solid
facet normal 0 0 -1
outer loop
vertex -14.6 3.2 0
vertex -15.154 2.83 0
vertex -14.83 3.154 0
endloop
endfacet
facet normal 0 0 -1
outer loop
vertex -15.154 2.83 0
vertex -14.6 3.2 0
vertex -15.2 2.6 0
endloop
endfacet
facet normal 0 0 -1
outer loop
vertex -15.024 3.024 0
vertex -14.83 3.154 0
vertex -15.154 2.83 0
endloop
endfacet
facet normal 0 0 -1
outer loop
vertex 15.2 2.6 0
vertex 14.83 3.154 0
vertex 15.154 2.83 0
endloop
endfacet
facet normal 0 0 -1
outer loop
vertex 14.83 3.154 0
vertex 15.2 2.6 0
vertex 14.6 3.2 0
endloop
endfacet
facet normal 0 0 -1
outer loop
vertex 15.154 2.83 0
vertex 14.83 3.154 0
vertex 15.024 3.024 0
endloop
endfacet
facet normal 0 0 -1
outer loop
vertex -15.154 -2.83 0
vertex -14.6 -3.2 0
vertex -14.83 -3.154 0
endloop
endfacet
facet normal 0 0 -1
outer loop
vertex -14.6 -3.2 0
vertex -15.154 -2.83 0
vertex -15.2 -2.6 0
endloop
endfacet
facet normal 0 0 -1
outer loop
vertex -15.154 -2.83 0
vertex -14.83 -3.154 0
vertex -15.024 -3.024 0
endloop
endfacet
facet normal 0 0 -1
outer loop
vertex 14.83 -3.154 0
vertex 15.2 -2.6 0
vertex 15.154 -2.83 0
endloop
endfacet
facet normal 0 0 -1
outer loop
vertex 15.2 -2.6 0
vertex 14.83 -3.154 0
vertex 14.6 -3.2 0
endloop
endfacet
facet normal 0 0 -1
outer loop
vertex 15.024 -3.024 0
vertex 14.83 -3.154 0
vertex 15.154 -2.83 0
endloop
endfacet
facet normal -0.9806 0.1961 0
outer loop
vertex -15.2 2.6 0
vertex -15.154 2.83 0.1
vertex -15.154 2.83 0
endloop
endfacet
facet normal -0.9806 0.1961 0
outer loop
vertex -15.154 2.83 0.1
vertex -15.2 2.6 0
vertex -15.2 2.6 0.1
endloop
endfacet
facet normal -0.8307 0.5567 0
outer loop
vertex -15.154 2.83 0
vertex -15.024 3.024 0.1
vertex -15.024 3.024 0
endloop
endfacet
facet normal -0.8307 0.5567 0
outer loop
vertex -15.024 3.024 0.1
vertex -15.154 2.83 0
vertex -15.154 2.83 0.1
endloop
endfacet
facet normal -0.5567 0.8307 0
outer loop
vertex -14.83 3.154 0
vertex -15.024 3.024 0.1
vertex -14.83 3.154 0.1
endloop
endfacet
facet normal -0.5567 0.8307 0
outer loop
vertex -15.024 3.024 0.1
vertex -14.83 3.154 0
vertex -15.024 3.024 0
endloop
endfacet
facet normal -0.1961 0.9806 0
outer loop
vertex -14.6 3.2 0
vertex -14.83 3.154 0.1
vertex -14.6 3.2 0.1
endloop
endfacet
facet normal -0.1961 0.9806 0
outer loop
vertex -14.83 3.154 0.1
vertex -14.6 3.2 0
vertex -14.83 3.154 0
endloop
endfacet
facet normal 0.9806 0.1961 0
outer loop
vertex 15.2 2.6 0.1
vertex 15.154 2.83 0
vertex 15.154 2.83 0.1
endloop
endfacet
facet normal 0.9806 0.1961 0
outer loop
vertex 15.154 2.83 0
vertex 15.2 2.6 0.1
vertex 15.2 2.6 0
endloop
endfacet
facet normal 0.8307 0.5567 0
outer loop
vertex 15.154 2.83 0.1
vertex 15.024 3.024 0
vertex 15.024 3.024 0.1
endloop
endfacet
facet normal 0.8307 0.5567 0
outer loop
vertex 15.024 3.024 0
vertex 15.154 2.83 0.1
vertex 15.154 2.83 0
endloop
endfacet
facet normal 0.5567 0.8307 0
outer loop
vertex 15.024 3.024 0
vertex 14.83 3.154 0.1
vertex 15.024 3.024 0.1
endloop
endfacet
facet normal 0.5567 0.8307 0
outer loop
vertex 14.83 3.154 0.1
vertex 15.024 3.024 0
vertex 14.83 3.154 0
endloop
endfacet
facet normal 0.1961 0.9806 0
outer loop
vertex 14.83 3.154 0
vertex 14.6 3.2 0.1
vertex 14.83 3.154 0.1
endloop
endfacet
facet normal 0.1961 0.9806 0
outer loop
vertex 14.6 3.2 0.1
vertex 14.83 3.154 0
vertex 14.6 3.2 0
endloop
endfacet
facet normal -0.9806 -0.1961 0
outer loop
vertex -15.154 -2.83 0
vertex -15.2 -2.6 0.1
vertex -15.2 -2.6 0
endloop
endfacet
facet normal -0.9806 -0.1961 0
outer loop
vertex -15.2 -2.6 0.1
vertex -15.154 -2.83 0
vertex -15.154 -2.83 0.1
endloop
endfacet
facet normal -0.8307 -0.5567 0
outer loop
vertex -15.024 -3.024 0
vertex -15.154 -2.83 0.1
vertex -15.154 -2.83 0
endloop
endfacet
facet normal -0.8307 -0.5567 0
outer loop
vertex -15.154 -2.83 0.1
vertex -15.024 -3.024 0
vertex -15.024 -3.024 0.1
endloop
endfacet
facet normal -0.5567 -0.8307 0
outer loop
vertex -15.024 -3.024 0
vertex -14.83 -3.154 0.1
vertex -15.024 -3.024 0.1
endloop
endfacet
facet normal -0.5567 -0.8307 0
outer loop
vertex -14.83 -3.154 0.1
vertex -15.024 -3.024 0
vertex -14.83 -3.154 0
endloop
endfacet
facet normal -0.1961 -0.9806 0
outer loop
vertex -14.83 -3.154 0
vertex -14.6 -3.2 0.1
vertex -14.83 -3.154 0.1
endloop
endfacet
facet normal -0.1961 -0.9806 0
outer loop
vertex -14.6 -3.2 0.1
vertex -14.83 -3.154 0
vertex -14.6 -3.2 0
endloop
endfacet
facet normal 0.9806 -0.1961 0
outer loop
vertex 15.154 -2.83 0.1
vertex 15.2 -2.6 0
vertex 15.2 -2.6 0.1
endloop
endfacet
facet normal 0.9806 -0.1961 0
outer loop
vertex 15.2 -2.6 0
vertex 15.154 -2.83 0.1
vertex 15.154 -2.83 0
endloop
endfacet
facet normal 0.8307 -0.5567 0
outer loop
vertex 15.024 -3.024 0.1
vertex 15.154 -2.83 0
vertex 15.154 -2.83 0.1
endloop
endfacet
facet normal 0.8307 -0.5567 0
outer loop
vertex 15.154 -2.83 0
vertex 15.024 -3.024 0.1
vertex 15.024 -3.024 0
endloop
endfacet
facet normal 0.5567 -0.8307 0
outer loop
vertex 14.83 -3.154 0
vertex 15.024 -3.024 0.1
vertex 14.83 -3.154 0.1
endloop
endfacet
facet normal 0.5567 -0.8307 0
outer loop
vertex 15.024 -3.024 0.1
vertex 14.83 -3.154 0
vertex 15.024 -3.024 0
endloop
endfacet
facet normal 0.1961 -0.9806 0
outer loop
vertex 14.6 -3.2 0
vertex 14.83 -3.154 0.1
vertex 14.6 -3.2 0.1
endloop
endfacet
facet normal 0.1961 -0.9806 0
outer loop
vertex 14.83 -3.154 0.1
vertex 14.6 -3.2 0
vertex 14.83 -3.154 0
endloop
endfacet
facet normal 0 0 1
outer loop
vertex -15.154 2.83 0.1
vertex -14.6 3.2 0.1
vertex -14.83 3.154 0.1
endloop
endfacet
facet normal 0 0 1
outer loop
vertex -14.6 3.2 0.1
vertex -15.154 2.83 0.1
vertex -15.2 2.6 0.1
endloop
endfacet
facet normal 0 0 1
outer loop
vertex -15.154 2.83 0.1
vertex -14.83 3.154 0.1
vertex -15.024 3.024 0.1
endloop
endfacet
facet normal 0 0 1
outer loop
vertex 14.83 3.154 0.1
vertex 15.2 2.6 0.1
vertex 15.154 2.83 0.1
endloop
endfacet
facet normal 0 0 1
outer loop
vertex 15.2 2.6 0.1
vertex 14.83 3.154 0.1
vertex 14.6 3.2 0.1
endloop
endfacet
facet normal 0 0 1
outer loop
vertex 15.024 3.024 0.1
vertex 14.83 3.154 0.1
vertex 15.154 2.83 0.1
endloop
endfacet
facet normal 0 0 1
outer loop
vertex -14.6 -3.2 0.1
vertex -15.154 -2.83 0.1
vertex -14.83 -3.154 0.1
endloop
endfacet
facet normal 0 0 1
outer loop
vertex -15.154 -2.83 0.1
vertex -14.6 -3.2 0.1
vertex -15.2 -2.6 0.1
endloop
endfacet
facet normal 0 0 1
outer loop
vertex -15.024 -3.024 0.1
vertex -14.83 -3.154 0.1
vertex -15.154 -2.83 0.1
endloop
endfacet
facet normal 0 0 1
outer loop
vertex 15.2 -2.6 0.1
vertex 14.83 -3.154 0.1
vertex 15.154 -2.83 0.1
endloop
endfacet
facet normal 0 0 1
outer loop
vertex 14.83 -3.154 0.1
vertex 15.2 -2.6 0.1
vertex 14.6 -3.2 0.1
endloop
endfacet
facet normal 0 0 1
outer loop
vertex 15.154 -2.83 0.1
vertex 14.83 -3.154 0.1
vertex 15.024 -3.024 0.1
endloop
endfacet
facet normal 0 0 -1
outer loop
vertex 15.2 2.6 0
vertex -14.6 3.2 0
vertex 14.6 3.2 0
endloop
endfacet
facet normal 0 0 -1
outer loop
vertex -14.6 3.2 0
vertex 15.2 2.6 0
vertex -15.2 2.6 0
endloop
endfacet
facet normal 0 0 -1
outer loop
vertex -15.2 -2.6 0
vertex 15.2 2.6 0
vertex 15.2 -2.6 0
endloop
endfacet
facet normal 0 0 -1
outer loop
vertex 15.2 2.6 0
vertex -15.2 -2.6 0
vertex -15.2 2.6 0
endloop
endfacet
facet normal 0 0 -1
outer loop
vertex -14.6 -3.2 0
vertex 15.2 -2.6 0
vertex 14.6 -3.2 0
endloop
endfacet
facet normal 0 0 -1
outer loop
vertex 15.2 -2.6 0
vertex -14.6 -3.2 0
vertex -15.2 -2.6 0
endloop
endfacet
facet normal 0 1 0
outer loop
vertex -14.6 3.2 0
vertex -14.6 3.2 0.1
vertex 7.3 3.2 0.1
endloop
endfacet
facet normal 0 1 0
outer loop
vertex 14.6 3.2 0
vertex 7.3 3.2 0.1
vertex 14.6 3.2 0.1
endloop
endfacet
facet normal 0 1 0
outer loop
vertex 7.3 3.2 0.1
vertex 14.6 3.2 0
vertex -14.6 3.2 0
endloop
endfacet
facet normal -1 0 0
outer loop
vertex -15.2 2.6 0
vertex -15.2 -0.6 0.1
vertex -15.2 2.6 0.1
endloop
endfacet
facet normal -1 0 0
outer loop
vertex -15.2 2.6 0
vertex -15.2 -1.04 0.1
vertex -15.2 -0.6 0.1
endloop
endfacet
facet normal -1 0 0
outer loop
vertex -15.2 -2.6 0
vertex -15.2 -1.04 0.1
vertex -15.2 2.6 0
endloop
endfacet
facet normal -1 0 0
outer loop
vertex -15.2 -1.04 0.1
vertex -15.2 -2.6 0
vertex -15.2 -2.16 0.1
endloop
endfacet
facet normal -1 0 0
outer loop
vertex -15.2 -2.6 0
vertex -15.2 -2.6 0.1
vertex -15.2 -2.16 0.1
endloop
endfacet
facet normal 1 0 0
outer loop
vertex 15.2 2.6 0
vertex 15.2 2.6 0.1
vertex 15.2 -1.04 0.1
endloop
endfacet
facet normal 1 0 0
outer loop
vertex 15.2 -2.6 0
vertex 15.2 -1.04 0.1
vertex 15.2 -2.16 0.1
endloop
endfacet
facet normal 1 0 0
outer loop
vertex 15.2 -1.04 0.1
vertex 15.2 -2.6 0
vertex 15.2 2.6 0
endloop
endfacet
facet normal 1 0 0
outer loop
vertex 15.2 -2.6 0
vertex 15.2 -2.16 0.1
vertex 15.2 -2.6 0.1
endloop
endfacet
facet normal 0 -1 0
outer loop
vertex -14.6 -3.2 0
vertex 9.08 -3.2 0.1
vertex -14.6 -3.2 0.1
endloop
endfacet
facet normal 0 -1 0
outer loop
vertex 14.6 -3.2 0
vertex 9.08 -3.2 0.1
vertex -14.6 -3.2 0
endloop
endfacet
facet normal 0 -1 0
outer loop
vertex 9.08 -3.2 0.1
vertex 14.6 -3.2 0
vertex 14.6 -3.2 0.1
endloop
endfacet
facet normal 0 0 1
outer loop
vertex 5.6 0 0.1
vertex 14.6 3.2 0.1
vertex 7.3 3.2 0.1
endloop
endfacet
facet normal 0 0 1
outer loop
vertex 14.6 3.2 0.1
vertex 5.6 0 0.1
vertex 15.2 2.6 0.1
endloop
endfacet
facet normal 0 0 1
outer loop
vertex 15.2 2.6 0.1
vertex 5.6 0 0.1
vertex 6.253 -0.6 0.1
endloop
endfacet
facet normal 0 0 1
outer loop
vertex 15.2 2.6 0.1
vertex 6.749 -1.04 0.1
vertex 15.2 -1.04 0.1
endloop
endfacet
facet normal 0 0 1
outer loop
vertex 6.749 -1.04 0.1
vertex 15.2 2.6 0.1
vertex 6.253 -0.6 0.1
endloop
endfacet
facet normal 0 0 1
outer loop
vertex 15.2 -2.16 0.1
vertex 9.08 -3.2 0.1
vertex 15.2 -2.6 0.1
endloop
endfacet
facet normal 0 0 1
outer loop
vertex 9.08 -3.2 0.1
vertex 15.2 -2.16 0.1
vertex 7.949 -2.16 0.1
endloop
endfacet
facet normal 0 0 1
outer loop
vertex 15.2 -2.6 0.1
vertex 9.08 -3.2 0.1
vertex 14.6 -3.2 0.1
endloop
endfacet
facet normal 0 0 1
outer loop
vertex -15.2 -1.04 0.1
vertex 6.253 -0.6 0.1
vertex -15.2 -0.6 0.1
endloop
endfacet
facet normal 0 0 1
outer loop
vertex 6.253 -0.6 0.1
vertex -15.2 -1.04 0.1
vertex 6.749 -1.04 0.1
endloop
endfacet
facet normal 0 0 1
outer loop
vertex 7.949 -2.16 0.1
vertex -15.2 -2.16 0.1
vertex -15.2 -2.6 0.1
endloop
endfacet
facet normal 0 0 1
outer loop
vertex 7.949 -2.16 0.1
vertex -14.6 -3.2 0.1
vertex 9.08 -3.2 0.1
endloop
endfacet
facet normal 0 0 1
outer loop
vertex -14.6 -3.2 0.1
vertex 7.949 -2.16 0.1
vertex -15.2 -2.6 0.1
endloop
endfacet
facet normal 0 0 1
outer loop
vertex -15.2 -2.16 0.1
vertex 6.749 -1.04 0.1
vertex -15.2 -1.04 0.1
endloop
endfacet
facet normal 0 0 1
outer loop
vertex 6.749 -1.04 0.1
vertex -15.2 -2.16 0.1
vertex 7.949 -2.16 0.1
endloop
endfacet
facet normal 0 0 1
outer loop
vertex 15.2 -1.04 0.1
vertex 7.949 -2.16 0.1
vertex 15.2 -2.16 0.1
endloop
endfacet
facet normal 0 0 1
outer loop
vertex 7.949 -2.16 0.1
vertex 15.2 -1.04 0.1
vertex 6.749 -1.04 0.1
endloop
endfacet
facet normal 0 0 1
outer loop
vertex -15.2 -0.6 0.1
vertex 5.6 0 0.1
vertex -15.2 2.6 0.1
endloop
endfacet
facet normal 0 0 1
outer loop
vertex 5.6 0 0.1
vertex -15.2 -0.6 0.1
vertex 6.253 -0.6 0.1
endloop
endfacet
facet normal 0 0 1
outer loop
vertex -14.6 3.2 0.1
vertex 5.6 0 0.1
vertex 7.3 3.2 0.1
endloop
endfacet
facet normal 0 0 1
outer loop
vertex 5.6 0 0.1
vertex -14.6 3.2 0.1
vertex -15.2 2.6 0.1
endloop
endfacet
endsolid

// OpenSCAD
// file: ../p/1-4cyli.scad
use <../lib.scad>
function ldraw_lib__1_4cyli() = [
// 0 Cylinder 0.25
// 0 Name: 1-4cyli.dat
// 0 Author: James Jessiman
// 0 !LDRAW_ORG Primitive UPDATE 2012-01
// 0 !LICENSE Licensed under CC BY 2.0 and CC BY 4.0 : see CAreadme.txt
// 
// 0 BFC CERTIFY CCW
  [0,"BFC","CERTIFY"],
  [0,"BFC","CCW"],
// 
// 0 !HISTORY 2002-03-23 [sbliss] Added BFC statement.
// 0 !HISTORY 2002-04-25 [PTadmin] Official Update 2002-02
// 0 !HISTORY 2007-06-22 [PTadmin] Header formatted for Contributor Agreement
// 0 !HISTORY 2008-07-01 [PTadmin] Official Update 2008-01
// 0 !HISTORY 2012-02-16 [Philo] Changed to CCW
// 0 !HISTORY 2012-03-30 [PTadmin] Official Update 2012-01
// 
// 
// 4 16 1 1 0 0.9239 1 0.3827 0.9239 0 0.3827 1 0 0
  [4,16,1,1,0,0.9239,1,0.3827,0.9239,0,0.3827,1,0,0],
// 5 24 1 0 0 1 1 0 0.9239 0 0.3827 1 0 -1
  [5,24,1,0,0,1,1,0,0.9239,0,0.3827,1,0,-1],
// 4 16 0.9239 1 0.3827 0.7071 1 0.7071 0.7071 0 0.7071 0.9239 0 0.3827
  [4,16,0.9239,1,0.3827,0.7071,1,0.7071,0.7071,0,0.7071,0.9239,0,0.3827],
// 5 24 0.9239 0 0.3827 0.9239 1 0.3827 0.7071 0 0.7071 1 0 0
  [5,24,0.9239,0,0.3827,0.9239,1,0.3827,0.7071,0,0.7071,1,0,0],
// 4 16 0.7071 1 0.7071 0.3827 1 0.9239 0.3827 0 0.9239 0.7071 0 0.7071
  [4,16,0.7071,1,0.7071,0.3827,1,0.9239,0.3827,0,0.9239,0.7071,0,0.7071],
// 5 24 0.7071 0 0.7071 0.7071 1 0.7071 0.3827 0 0.9239 0.9239 0 0.3827
  [5,24,0.7071,0,0.7071,0.7071,1,0.7071,0.3827,0,0.9239,0.9239,0,0.3827],
// 4 16 0.3827 1 0.9239 0 1 1 0 0 1 0.3827 0 0.9239
  [4,16,0.3827,1,0.9239,0,1,1,0,0,1,0.3827,0,0.9239],
// 5 24 0.3827 0 0.9239 0.3827 1 0.9239 0 0 1 0.7071 0 0.7071
  [5,24,0.3827,0,0.9239,0.3827,1,0.9239,0,0,1,0.7071,0,0.7071],
// 5 24 0 0 1 0 1 1 0.3827 0 0.9239 -1 0 1
  [5,24,0,0,1,0,1,1,0.3827,0,0.9239,-1,0,1],
];
module ldraw_lib__1_4cyli(step=0, col=false, unit=2/5, alt=false, line=0.2, solid=!$preview)
    makepoly(ldraw_lib__1_4cyli(), step=step, col=col, unit=unit, alt=alt, line=line, solid=solid);
ldraw_lib__1_4cyli(line=0.2);
// file: ../p/1-4chrd.scad
use <../lib.scad>
function ldraw_lib__1_4chrd() = [
// 0 Chord 0.25
// 0 Name: 1-4chrd.dat
// 0 Author: Tony Hafner [hafhead]
// 0 !LDRAW_ORG Primitive UPDATE 2012-02
// 0 !LICENSE Licensed under CC BY 2.0 and CC BY 4.0 : see CAreadme.txt
// 
// 0 BFC CERTIFY CCW
  [0,"BFC","CERTIFY"],
  [0,"BFC","CCW"],
// 
// 0 !HISTORY 2004-04-22 [PTadmin] Official Update 2004-02
// 0 !HISTORY 2007-10-09 [PTadmin] Header formatted for Contributor Agreement
// 0 !HISTORY 2008-07-01 [PTadmin] Official Update 2008-01
// 0 !HISTORY 2012-08-02 [MMR1988] Re-creation with PrimGen2 and Rectifier
// 0 !HISTORY 2012-08-09 [PTadmin] Official Update 2012-02
// 
// 
// 4 16 0.9239 0 0.3827 0.3827 0 0.9239 0 0 1 1 0 0
  [4,16,0.9239,0,0.3827,0.3827,0,0.9239,0,0,1,1,0,0],
// 3 16 0.7071 0 0.7071 0.3827 0 0.9239 0.9239 0 0.3827
  [3,16,0.7071,0,0.7071,0.3827,0,0.9239,0.9239,0,0.3827],
];
module ldraw_lib__1_4chrd(step=0, col=false, unit=2/5, alt=false, line=0.2, solid=!$preview)
    makepoly(ldraw_lib__1_4chrd(), step=step, col=col, unit=unit, alt=alt, line=line, solid=solid);
ldraw_lib__1_4chrd(line=0.2);
// main file
use <../lib.scad>
use <../p/1-4chrd.scad>
use <../p/1-4cyli.scad>
function ldraw_lib__6142275f() = [
// 0 Sticker  0.8 x  3.8 with Red Line on Black, Grey and White Background Right
// 0 Name: 6142275f.dat
// 0 Author: Massimo Maso [Sirio]
// 0 !LDRAW_ORG Part UPDATE 2022-06
// 0 !LICENSE Licensed under CC BY 2.0 and CC BY 4.0 : see CAreadme.txt
// 
// 0 BFC CERTIFY CCW
  [0,"BFC","CERTIFY"],
  [0,"BFC","CCW"],
// 
// 0 !KEYWORDS Audi, e-tron, quattro, R18, Set 75872, Speed Champions
// 
// 0 !HISTORY 2022-12-20 [PTadmin] Official Update 2022-06
// 
// 
// 0 // Primitives
// 1 16 -36.5 0 6.5 -1.5 0 0 0 -1 0 0 0 1.5 1-4chrd.dat
  [1,16,-36.5,0,6.5,-1.5,0,0,0,-1,0,0,0,1.5, ldraw_lib__1_4chrd()],
// 1 16 36.5 0 6.5 1.5 0 0 0 -1 0 0 0 1.5 1-4chrd.dat
  [1,16,36.5,0,6.5,1.5,0,0,0,-1,0,0,0,1.5, ldraw_lib__1_4chrd()],
// 1 16 -36.5 0 -6.5 -1.5 0 0 0 -1 0 0 0 -1.5 1-4chrd.dat
  [1,16,-36.5,0,-6.5,-1.5,0,0,0,-1,0,0,0,-1.5, ldraw_lib__1_4chrd()],
// 1 16 36.5 0 -6.5 1.5 0 0 0 -1 0 0 0 -1.5 1-4chrd.dat
  [1,16,36.5,0,-6.5,1.5,0,0,0,-1,0,0,0,-1.5, ldraw_lib__1_4chrd()],
// 1 16 -36.5 0 6.5 -1.5 0 0 0 -.25 0 0 0 1.5 1-4cyli.dat
  [1,16,-36.5,0,6.5,-1.5,0,0,0,-.25,0,0,0,1.5, ldraw_lib__1_4cyli()],
// 1 16 36.5 0 6.5 1.5 0 0 0 -.25 0 0 0 1.5 1-4cyli.dat
  [1,16,36.5,0,6.5,1.5,0,0,0,-.25,0,0,0,1.5, ldraw_lib__1_4cyli()],
// 1 16 -36.5 0 -6.5 -1.5 0 0 0 -.25 0 0 0 -1.5 1-4cyli.dat
  [1,16,-36.5,0,-6.5,-1.5,0,0,0,-.25,0,0,0,-1.5, ldraw_lib__1_4cyli()],
// 1 16 36.5 0 -6.5 1.5 0 0 0 -.25 0 0 0 -1.5 1-4cyli.dat
  [1,16,36.5,0,-6.5,1.5,0,0,0,-.25,0,0,0,-1.5, ldraw_lib__1_4cyli()],
// 1 15 -36.5 -.25 6.5 -1.5 0 0 0 1 0 0 0 1.5 1-4chrd.dat
  [1,15,-36.5,-.25,6.5,-1.5,0,0,0,1,0,0,0,1.5, ldraw_lib__1_4chrd()],
// 1 0 36.5 -.25 6.5 1.5 0 0 0 1 0 0 0 1.5 1-4chrd.dat
  [1,0,36.5,-.25,6.5,1.5,0,0,0,1,0,0,0,1.5, ldraw_lib__1_4chrd()],
// 1 71 -36.5 -.25 -6.5 -1.5 0 0 0 1 0 0 0 -1.5 1-4chrd.dat
  [1,71,-36.5,-.25,-6.5,-1.5,0,0,0,1,0,0,0,-1.5, ldraw_lib__1_4chrd()],
// 1 0 36.5 -.25 -6.5 1.5 0 0 0 1 0 0 0 -1.5 1-4chrd.dat
  [1,0,36.5,-.25,-6.5,1.5,0,0,0,1,0,0,0,-1.5, ldraw_lib__1_4chrd()],
// 0 // Bottom faces
// 4 16 36.5 0 8 38 0 6.5 -38 0 6.5 -36.5 0 8
  [4,16,36.5,0,8,38,0,6.5,-38,0,6.5,-36.5,0,8],
// 4 16 38 0 6.5 38 0 -6.5 -38 0 -6.5 -38 0 6.5
  [4,16,38,0,6.5,38,0,-6.5,-38,0,-6.5,-38,0,6.5],
// 4 16 36.5 0 -8 -36.5 0 -8 -38 0 -6.5 38 0 -6.5
  [4,16,36.5,0,-8,-36.5,0,-8,-38,0,-6.5,38,0,-6.5],
// 0 // Lateral faces
// 3 16 -36.5 0 8 -36.5 -.25 8 18.25 -.25 8
  [3,16,-36.5,0,8,-36.5,-.25,8,18.25,-.25,8],
// 4 16 -36.5 0 8 18.25 -.25 8 36.5 -.25 8 36.5 0 8
  [4,16,-36.5,0,8,18.25,-.25,8,36.5,-.25,8,36.5,0,8],
// 3 16 -38 0 6.5 -38 -.25 -1.5 -38 -.25 6.5
  [3,16,-38,0,6.5,-38,-.25,-1.5,-38,-.25,6.5],
// 3 16 -38 0 6.5 -38 -.25 -2.6 -38 -.25 -1.5
  [3,16,-38,0,6.5,-38,-.25,-2.6,-38,-.25,-1.5],
// 4 16 -38 0 6.5 -38 0 -6.5 -38 -.25 -5.4 -38 -.25 -2.6
  [4,16,-38,0,6.5,-38,0,-6.5,-38,-.25,-5.4,-38,-.25,-2.6],
// 3 16 -38 0 -6.5 -38 -.25 -6.5 -38 -.25 -5.4
  [3,16,-38,0,-6.5,-38,-.25,-6.5,-38,-.25,-5.4],
// 3 16 38 0 6.5 38 -.25 6.5 38 -.25 -2.6
  [3,16,38,0,6.5,38,-.25,6.5,38,-.25,-2.6],
// 4 16 38 0 6.5 38 -.25 -2.6 38 -.25 -5.4 38 0 -6.5
  [4,16,38,0,6.5,38,-.25,-2.6,38,-.25,-5.4,38,0,-6.5],
// 3 16 38 0 -6.5 38 -.25 -5.4 38 -.25 -6.5
  [3,16,38,0,-6.5,38,-.25,-5.4,38,-.25,-6.5],
// 3 16 -36.5 0 -8 22.7 -.25 -8 -36.5 -.25 -8
  [3,16,-36.5,0,-8,22.7,-.25,-8,-36.5,-.25,-8],
// 4 16 -36.5 0 -8 36.5 0 -8 36.5 -.25 -8 22.7 -.25 -8
  [4,16,-36.5,0,-8,36.5,0,-8,36.5,-.25,-8,22.7,-.25,-8],
// 0 // Top faces
// 0 // Black faces
// 4 0 38 -.25 6.5 36.5 -.25 8 18.25 -.25 8 14 -.25 0
  [4,0,38,-.25,6.5,36.5,-.25,8,18.25,-.25,8,14,-.25,0],
// 3 0 38 -.25 6.5 14 -.25 0 15.6313 -.25 -1.5
  [3,0,38,-.25,6.5,14,-.25,0,15.6313,-.25,-1.5],
// 4 0 38 -.25 6.5 15.6313 -.25 -1.5 16.8725 -.25 -2.6 38 -.25 -2.6
  [4,0,38,-.25,6.5,15.6313,-.25,-1.5,16.8725,-.25,-2.6,38,-.25,-2.6],
// 4 0 38 -.25 -6.5 38 -.25 -5.4 19.8725 -.25 -5.4 22.7 -.25 -8
  [4,0,38,-.25,-6.5,38,-.25,-5.4,19.8725,-.25,-5.4,22.7,-.25,-8],
// 3 0 38 -.25 -6.5 22.7 -.25 -8 36.5 -.25 -8
  [3,0,38,-.25,-6.5,22.7,-.25,-8,36.5,-.25,-8],
// 0 // Grey faces
// 4 71 16.8725 -.25 -2.6 15.6313 -.25 -1.5 -38 -.25 -1.5 -38 -.25 -2.6
  [4,71,16.8725,-.25,-2.6,15.6313,-.25,-1.5,-38,-.25,-1.5,-38,-.25,-2.6],
// 3 71 19.8725 -.25 -5.4 -38 -.25 -5.4 -38 -.25 -6.5
  [3,71,19.8725,-.25,-5.4,-38,-.25,-5.4,-38,-.25,-6.5],
// 4 71 19.8725 -.25 -5.4 -38 -.25 -6.5 -36.5 -.25 -8 22.7 -.25 -8
  [4,71,19.8725,-.25,-5.4,-38,-.25,-6.5,-36.5,-.25,-8,22.7,-.25,-8],
// 0 // Red faces
// 4 4 -38 -.25 -2.6 -38 -.25 -5.4 19.8725 -.25 -5.4 16.8725 -.25 -2.6
  [4,4,-38,-.25,-2.6,-38,-.25,-5.4,19.8725,-.25,-5.4,16.8725,-.25,-2.6],
// 4 4 38 -.25 -2.6 16.8725 -.25 -2.6 19.8725 -.25 -5.4 38 -.25 -5.4
  [4,4,38,-.25,-2.6,16.8725,-.25,-2.6,19.8725,-.25,-5.4,38,-.25,-5.4],
// 0 // White faces
// 4 15 -38 -.25 6.5 -38 -.25 -1.5 15.6313 -.25 -1.5 14 -.25 0
  [4,15,-38,-.25,6.5,-38,-.25,-1.5,15.6313,-.25,-1.5,14,-.25,0],
// 4 15 -38 -.25 6.5 14 -.25 0 18.25 -.25 8 -36.5 -.25 8
  [4,15,-38,-.25,6.5,14,-.25,0,18.25,-.25,8,-36.5,-.25,8],
];
module ldraw_lib__6142275f(step=0, col=false, unit=2/5, alt=false, line=0.2, solid=!$preview)
    makepoly(ldraw_lib__6142275f(), step=step, col=col, unit=unit, alt=alt, line=line, solid=solid);
ldraw_lib__6142275f(line=0.2);
